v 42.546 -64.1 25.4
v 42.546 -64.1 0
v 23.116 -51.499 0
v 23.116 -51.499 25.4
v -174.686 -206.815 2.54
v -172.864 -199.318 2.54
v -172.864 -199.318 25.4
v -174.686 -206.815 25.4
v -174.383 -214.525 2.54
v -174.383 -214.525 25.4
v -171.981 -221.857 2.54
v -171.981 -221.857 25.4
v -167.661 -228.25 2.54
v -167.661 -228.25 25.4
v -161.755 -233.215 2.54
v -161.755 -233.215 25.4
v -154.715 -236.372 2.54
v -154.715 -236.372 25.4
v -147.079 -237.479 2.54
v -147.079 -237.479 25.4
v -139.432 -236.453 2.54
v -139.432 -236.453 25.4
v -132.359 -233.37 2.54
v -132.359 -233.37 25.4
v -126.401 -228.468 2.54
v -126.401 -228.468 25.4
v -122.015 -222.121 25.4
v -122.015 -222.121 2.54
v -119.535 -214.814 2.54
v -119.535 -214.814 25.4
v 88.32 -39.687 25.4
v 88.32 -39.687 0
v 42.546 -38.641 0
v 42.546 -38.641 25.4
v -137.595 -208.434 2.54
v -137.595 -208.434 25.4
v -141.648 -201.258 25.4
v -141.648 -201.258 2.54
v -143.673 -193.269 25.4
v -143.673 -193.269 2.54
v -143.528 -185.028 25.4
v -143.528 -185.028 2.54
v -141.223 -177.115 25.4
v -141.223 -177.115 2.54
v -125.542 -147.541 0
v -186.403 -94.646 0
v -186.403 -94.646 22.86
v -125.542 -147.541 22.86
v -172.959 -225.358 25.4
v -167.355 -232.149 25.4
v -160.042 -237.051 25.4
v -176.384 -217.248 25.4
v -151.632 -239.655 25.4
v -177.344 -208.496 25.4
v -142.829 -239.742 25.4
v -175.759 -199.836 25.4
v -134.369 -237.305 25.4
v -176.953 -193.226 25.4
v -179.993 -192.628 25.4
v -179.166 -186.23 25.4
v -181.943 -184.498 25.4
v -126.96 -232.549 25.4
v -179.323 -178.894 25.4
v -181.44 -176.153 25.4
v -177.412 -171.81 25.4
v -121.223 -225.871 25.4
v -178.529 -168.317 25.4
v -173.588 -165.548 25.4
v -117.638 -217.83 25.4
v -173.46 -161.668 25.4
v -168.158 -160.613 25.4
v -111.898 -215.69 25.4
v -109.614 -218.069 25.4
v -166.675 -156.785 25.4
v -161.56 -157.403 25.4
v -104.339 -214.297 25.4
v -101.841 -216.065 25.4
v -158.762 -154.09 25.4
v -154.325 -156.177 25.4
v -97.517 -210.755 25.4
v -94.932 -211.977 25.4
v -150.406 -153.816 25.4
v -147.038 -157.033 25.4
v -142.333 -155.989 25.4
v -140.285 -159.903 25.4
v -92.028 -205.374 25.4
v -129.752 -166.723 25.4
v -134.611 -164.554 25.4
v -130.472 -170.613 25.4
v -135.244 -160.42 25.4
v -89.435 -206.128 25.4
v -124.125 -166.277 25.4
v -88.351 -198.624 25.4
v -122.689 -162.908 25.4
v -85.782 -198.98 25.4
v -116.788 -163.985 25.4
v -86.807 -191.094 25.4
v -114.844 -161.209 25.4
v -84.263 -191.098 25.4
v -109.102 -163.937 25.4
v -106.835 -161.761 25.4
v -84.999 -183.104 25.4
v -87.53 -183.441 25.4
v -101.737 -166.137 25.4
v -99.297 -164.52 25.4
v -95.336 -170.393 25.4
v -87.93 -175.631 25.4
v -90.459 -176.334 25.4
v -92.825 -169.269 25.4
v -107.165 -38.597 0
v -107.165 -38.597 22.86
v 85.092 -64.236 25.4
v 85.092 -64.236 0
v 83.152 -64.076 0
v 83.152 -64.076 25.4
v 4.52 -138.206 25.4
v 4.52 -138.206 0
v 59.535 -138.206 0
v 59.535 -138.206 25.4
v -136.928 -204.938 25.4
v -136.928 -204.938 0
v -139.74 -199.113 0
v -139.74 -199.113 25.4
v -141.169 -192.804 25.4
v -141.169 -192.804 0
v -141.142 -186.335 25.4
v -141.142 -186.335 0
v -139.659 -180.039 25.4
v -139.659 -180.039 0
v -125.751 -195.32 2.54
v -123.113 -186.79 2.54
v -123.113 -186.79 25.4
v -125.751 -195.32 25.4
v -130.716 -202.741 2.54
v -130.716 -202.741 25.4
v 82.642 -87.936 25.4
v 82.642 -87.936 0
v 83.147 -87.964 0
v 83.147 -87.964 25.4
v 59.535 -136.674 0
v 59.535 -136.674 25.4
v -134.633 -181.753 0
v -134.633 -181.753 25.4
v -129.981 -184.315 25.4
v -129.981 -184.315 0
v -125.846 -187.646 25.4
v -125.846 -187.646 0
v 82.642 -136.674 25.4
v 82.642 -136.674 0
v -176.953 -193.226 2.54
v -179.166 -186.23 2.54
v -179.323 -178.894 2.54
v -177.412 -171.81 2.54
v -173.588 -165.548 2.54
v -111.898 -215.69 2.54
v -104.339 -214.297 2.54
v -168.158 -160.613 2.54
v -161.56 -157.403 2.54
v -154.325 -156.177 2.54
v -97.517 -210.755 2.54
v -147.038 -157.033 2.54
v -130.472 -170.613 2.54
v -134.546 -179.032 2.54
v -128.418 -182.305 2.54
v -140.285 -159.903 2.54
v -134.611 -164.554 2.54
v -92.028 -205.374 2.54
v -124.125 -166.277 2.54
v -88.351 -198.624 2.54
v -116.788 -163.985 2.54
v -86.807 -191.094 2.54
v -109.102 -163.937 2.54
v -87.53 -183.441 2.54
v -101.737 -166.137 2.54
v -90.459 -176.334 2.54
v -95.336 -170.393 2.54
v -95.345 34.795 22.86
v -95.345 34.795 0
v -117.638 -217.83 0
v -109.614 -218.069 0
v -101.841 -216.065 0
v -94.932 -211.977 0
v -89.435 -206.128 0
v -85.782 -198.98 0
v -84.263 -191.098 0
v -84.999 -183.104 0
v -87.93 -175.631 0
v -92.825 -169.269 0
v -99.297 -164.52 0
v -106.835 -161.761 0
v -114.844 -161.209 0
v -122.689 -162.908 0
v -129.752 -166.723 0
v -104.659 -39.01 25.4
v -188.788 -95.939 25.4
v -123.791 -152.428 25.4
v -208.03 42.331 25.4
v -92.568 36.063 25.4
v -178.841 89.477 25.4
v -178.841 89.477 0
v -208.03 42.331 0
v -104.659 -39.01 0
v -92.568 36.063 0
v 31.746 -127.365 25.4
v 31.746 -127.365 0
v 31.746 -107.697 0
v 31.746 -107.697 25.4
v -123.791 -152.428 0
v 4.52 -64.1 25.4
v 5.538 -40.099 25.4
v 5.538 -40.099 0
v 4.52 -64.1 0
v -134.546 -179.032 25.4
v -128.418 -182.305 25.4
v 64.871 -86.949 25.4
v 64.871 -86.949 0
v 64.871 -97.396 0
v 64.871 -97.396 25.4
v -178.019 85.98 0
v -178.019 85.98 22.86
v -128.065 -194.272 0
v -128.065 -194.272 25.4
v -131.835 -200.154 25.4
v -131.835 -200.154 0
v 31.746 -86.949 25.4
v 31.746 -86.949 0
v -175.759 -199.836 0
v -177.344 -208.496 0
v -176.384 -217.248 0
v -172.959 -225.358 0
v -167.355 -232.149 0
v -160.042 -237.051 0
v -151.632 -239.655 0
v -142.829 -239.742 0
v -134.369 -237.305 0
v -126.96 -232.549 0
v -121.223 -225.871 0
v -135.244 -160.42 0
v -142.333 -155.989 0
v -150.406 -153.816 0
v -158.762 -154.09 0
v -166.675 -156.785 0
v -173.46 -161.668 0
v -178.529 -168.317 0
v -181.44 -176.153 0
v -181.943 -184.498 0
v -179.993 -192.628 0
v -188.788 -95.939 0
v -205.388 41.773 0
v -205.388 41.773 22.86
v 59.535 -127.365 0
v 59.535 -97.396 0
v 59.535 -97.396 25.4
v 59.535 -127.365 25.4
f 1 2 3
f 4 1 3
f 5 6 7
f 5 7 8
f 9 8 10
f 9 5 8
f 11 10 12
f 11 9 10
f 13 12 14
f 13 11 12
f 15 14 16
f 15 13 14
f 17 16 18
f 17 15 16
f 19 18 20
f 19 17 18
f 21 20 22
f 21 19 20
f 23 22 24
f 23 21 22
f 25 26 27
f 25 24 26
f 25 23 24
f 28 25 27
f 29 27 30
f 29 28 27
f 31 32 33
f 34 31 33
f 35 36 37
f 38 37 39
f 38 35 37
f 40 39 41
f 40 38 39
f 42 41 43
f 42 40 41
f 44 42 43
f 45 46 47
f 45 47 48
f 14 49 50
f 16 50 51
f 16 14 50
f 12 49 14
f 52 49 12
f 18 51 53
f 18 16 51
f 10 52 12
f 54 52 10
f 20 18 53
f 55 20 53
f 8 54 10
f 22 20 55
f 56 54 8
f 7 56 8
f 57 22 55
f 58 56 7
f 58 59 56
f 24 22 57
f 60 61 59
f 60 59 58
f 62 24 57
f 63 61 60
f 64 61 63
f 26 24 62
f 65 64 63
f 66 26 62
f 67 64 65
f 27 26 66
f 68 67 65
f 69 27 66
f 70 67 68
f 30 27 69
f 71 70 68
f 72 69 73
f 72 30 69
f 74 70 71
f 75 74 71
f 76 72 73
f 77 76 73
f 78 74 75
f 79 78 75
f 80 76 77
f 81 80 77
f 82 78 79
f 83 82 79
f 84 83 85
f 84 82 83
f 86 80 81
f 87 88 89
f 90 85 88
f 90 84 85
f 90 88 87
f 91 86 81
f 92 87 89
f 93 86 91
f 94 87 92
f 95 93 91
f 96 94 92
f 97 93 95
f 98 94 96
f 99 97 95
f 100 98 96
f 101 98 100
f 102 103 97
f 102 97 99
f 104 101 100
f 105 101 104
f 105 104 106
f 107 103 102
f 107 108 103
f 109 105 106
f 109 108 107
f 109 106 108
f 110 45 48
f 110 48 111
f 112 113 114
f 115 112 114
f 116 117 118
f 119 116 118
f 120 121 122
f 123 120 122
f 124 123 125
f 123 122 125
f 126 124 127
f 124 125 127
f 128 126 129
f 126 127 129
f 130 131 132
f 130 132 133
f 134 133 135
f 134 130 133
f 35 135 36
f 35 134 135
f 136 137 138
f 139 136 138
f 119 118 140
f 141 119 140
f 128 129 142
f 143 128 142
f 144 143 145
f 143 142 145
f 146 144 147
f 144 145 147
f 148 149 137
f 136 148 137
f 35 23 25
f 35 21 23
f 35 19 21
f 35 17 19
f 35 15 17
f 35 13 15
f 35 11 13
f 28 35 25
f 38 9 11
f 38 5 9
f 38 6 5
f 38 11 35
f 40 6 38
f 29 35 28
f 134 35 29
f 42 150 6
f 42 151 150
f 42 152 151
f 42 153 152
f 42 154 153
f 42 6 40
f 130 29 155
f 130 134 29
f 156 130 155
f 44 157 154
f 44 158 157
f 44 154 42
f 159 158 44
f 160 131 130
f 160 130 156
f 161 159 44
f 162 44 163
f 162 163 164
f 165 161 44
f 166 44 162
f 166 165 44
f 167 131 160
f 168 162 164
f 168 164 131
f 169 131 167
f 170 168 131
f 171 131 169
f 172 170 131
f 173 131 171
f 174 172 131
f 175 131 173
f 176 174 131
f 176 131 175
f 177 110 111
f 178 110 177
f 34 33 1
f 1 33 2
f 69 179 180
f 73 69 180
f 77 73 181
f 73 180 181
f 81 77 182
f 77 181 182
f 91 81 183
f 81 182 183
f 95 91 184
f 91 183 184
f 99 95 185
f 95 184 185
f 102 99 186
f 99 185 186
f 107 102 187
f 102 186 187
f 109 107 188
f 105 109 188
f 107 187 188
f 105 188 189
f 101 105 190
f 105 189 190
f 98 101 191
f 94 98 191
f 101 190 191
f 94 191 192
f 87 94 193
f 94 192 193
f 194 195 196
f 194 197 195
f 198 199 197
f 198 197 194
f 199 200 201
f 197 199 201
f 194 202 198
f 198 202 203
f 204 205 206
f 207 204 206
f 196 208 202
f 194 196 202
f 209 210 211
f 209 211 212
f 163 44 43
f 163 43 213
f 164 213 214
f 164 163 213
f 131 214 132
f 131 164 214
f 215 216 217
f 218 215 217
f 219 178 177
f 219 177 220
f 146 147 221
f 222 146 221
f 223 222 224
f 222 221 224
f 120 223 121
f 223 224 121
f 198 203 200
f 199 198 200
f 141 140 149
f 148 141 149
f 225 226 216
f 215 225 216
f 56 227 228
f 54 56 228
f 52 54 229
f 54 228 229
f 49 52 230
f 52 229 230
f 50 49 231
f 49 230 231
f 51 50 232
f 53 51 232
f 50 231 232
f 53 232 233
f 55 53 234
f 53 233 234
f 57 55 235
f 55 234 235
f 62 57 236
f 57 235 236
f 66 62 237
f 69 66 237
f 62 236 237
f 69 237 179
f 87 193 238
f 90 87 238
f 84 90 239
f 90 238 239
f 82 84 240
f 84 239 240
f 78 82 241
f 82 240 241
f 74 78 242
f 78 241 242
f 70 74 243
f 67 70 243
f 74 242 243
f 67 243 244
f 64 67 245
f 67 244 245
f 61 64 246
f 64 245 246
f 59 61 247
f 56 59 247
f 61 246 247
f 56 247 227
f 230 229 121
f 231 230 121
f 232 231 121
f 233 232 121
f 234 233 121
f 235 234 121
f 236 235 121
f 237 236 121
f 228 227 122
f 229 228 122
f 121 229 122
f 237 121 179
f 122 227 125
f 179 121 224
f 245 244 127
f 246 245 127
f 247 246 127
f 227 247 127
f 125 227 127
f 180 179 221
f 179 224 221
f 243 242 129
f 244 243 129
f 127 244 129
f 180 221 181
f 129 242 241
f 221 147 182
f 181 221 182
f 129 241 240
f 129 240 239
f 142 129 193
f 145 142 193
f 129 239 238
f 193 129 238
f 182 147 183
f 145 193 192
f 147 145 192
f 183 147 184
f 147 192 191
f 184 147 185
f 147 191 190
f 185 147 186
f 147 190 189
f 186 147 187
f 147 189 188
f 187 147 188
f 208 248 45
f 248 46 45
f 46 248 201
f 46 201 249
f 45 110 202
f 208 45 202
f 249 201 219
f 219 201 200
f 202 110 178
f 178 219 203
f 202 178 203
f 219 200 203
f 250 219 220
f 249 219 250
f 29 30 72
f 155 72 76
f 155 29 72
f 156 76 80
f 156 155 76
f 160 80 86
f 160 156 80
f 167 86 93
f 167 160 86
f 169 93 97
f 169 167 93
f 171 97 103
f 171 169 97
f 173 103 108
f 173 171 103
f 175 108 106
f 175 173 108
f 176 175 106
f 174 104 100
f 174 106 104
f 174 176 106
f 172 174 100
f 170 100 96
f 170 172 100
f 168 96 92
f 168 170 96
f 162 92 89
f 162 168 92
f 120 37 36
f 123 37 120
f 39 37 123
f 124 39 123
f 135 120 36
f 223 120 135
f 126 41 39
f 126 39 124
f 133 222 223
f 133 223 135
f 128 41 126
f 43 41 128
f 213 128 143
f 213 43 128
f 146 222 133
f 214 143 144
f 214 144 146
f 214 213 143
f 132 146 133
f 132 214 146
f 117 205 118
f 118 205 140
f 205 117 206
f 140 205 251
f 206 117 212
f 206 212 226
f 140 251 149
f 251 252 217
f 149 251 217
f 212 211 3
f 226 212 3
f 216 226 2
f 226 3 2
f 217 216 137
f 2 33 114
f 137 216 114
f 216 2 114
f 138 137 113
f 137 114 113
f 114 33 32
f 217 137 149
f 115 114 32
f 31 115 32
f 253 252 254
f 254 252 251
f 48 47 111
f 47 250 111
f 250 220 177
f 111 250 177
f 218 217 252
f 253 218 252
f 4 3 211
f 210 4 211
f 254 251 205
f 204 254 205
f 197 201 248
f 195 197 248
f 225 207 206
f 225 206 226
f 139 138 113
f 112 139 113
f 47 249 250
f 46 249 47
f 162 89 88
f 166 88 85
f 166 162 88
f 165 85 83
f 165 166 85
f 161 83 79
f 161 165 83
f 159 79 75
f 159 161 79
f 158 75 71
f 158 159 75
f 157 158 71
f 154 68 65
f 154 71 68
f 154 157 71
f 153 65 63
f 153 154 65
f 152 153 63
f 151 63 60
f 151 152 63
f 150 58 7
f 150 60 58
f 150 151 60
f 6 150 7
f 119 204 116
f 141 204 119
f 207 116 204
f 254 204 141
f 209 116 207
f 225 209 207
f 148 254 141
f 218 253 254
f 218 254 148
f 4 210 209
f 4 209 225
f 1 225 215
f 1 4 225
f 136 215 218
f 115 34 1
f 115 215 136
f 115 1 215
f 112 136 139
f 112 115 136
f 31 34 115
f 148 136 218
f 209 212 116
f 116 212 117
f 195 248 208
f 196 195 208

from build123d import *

# Parameters (mm, degrees)
F1_DEPTH = 25.4
F3_DEPTH = 25.4
F4_T     = -2.54
F5_W     = 27.2268103436
F5_H     = 10.8409523964
F5_W_2   = 23.1075808406
F5_H_2   = 9.3090385199
F5_H_3   = 6.7053586245
F5_H_4   = 12.9625052214
F6_DEPTH = 25.4
F7_T     = -2.54


# Not quite as in the source:
# - ends of sketch curves that miss each other by under 0.0002 mm in the source are joined


with BuildPart() as f1:
    # F0 (on Top) → F1 (new body)
    with BuildSketch(Plane.XY):
        Polygon((-156.3564315383, 1.9787269735), (-188.787728548, -95.9389954805), (-123.7907707691, -152.4280905724), (-104.6589389443, -39.0103124082), (-155.8479517698, 0), align=None)
        Polygon((-208.030372858, 42.3308461905), (-188.787728548, -95.9389954805), (-156.3564315383, 1.9787269735), (-178.8411438465, 89.4770100713), align=None)
        Polygon((-178.8411438465, 89.4770100713), (-156.3564315383, 1.9787269735), (-155.8479517698, 0), (-104.6589389443, -39.0103124082), (-92.5675530585, 36.0631288163), align=None)
    extrude(amount=F1_DEPTH)

    # F4
    f4_openings = [f1.faces().sort_by_distance(p)[0] for p in [
        (-151.431533, -21.743428, 0),
    ]]
    offset(amount=F4_T, openings=f4_openings)


with BuildPart() as f3:
    # F2 (on Top) → F3 (new body)
    with BuildSketch(Plane.XY):
        with BuildLine():
            ThreePointArc((-125.8460203447, -187.6461548391), (-125.4230402026, -184.8440134333), (-125.2815768128, -182.0136606693))
            ThreePointArc((-125.2815768128, -182.0136606693), (-126.4221290125, -174.0482010322), (-129.7521277548, -166.7228672564))
            ThreePointArc((-129.7521277548, -166.7228672564), (-135.6943033651, -172.6451210363), (-139.658973853, -180.0386268854))
            ThreePointArc((-139.658973853, -180.0386268854), (-132.2511693873, -182.9321324426), (-125.8460203447, -187.6461548391))
        make_face()
        with BuildLine():
            ThreePointArc((-129.7521277548, -166.7228672564), (-126.4221290125, -174.0482010322), (-125.2815768128, -182.0136606693))
            ThreePointArc((-125.2815768128, -182.0136606693), (-125.4230402026, -184.8440134333), (-125.8460203447, -187.6461548391))
            ThreePointArc((-125.8460203447, -187.6461548391), (-118.9342268143, -197.6635782995), (-116.5005442713, -209.5882943076))
            ThreePointArc((-116.5005442713, -209.5882943076), (-116.7862081683, -213.7481993276), (-117.637836757, -217.8300055925))
            ThreePointArc((-117.637836757, -217.8300055925), (-94.3883375859, -211.5305918967), (-84.2287479373, -189.6901577711))
            ThreePointArc((-84.2287479373, -189.6901577711), (-99.9217410648, -164.1956753112), (-129.7521277548, -166.7228672564))
        make_face()
        with BuildLine():
            ThreePointArc((-139.658973853, -180.0386268854), (-135.6943033651, -172.6451210363), (-129.7521277548, -166.7228672564))
            ThreePointArc((-129.7521277548, -166.7228672564), (-170.2484998371, -158.9754699319), (-175.7588912266, -199.8363791712))
            ThreePointArc((-175.7588912266, -199.8363791712), (-161.5652178843, -182.9058167896), (-139.658973853, -180.0386268854))
        make_face()
        with BuildLine():
            ThreePointArc((-116.5005442713, -209.5882943076), (-118.9342268143, -197.6635782995), (-125.8460203447, -187.6461548391))
            ThreePointArc((-125.8460203447, -187.6461548391), (-129.7681307705, -197.3294537383), (-136.9277512541, -204.9379399409))
            ThreePointArc((-136.9277512541, -204.9379399409), (-128.6511581783, -213.4314047769), (-117.637836757, -217.8300055925))
            ThreePointArc((-117.637836757, -217.8300055925), (-116.7862081683, -213.7481993276), (-116.5005442713, -209.5882943076))
        make_face()
        with BuildLine():
            ThreePointArc((-139.658973853, -180.0386268854), (-161.5652178843, -182.9058167896), (-175.7588912266, -199.8363791712))
            ThreePointArc((-175.7588912266, -199.8363791712), (-157.3640992757, -210.1569336627), (-136.9277512541, -204.9379399409))
            ThreePointArc((-136.9277512541, -204.9379399409), (-141.1692469428, -192.8037411296), (-139.658973853, -180.0386268854))
        make_face()
        with BuildLine():
            ThreePointArc((-136.9277512541, -204.9379399409), (-157.3640992757, -210.1569336627), (-175.7588912266, -199.8363791712))
            ThreePointArc((-175.7588912266, -199.8363791712), (-155.9319849015, -238.6586300828), (-117.637836757, -217.8300055925))
            ThreePointArc((-117.637836757, -217.8300055925), (-128.6511581783, -213.4314047769), (-136.9277512541, -204.9379399409))
        make_face()
    extrude(amount=F3_DEPTH)

    # F7
    f7_openings = [f3.faces().sort_by_distance(p)[0] for p in [
        (-169.486097, -160.034726, 25.4),
    ]]
    offset(amount=F7_T, openings=f7_openings, kind=Kind.INTERSECTION)


with BuildPart() as f6:
    # F5 (on Top) → F6 (new body)
    with BuildSketch(Plane.XY):
        Polygon((4.5195547864, -64.0997934229), (42.5464881825, -64.0997934229), (23.116490582, -51.49882088), align=None)
        Polygon((4.5195547864, -97.3955392838), (31.7463651299, -97.3955392838), (31.7463651299, -86.9494602084), align=None)
        Polygon((5.5383988656, -40.0988683105), (4.5195547864, -64.0997934229), (23.116490582, -51.49882088), align=None)
        Polygon((59.5347508788, -62.1402259879), (42.5464881825, -64.0997934229), (83.1468105316, -64.0997934229), (83.1517481659, -64.0764903684), align=None)
        with Locations((18.1329599582, -132.7852457762)):
            Rectangle(F5_W, F5_H)
        Polygon((64.8705512285, -97.3955392838), (82.6423317194, -97.3955392838), (64.8705512285, -86.9494602084), align=None)
        Polygon((59.5347508788, -107.6969057322), (82.6423317194, -107.6969057322), (82.6423317194, -97.3955392838), (64.8705512285, -97.3955392838), (59.5347508788, -97.3955392838), align=None)
        Polygon((59.5347508788, -136.6738080978), (59.5347508788, -127.364769578), (31.7463651299, -127.364769578), (31.7463651299, -138.2057219744), (59.5347508788, -138.2057219744), align=None)
        with Locations((71.0885412991, -132.0192888379)):
            Rectangle(F5_W_2, F5_H_2)
        with Locations((18.1329599582, -124.0120902658)):
            Rectangle(F5_W, F5_H_3)
        Polygon((64.8705512285, -86.9494602084), (82.6423317194, -97.3955392838), (82.6423317194, -87.9362548824), align=None)
        with Locations((71.0885412991, -114.1781583428)):
            Rectangle(F5_W_2, F5_H_4)
        with Locations((71.0885412991, -124.0120902658)):
            Rectangle(F5_W_2, F5_H_3)
        Polygon((82.6423317194, -87.6677388178), (82.6423317194, -87.9362548824), (83.1468105316, -87.9642665386), align=None)
        Polygon((4.5195547864, -107.6969057322), (31.7463651299, -107.6969057322), (31.7463651299, -97.3955392838), (4.5195547864, -97.3955392838), (4.5195547864, -102.546222508), align=None)
        with Locations((18.1329599582, -114.1781583428)):
            Rectangle(F5_W, F5_H_4)
        Polygon((42.5464881825, -64.0997934229), (82.6423317194, -87.6677388178), (83.1468105316, -87.9642665386), (85.0922316313, -64.2355829477), (83.1517481659, -64.0764903684), (83.1468105316, -64.0997934229), align=None)
        Polygon((4.5195547864, -86.9494602084), (6.1366017055, -86.9494602084), (42.5464881825, -64.0997934229), (4.5195547864, -64.0997934229), align=None)
        Polygon((31.7463651299, -86.9494602084), (64.8705512285, -86.9494602084), (82.6423317194, -87.9362548824), (82.6423317194, -87.6677388178), (42.5464881825, -64.0997934229), (6.1366017055, -86.9494602084), align=None)
        Polygon((4.5195547864, -87.9642665386), (6.1366017055, -86.9494602084), (4.5195547864, -86.9494602084), align=None)
        Polygon((4.5195547864, -97.3955392838), (31.7463651299, -86.9494602084), (6.1366017055, -86.9494602084), (4.5195547864, -87.9642665386), align=None)
        Polygon((42.5464881825, -38.6408381164), (42.5464881825, -64.0997934229), (59.5347508788, -62.1402259879), (83.1517481659, -64.0764903684), (88.3195400238, -39.6872125566), align=None)
    extrude(amount=F6_DEPTH)


solid = Compound([f1.part, f3.part, f6.part])
